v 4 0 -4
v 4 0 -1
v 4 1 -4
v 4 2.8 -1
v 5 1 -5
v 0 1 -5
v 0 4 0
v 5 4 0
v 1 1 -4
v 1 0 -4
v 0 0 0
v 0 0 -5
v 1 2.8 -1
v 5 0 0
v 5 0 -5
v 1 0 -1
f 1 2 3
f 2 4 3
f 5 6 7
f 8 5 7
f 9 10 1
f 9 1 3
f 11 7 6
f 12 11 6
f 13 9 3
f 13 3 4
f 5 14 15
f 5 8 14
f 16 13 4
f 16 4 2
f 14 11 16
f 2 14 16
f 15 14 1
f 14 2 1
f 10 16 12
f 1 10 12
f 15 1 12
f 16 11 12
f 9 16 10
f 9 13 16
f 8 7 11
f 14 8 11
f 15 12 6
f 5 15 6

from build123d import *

# Parameters (mm, degrees)
BOSS_EXTRUDE1_DEPTH = 5
CUT_EXTRUDE1_DEPTH  = 4
BOSS_EXTRUDE2_DEPTH = 1


with BuildPart() as part:
    # Sketch3 → Boss-Extrude1 (new body)
    with BuildSketch(Plane(origin=(0, 0, 0), x_dir=(0, 0, -1), z_dir=(1, 0, 0))):
        Polygon((5, 0), (5, 1), (0, 4), (0, 0), align=None)
    extrude(amount=BOSS_EXTRUDE1_DEPTH)

    # Sketch3<3> → Cut-Extrude1 (cut)
    with BuildSketch(Plane(origin=(0, 0, 0), x_dir=(0, 0, -1), z_dir=(1, 0, 0))):
        Polygon((1, 0), (4, 0), (4, 1), (1, 2.8), align=None)
    extrude(amount=CUT_EXTRUDE1_DEPTH, mode=Mode.SUBTRACT)

    # Sketch3<4> → Boss-Extrude2 (add)
    with BuildSketch(Plane(origin=(0, 0, 0), x_dir=(0, 0, -1), z_dir=(1, 0, 0))):
        Polygon((1, 0), (4, 0), (4, 1), (1, 2.8), align=None)
    extrude(amount=BOSS_EXTRUDE2_DEPTH)


solid = part.part
